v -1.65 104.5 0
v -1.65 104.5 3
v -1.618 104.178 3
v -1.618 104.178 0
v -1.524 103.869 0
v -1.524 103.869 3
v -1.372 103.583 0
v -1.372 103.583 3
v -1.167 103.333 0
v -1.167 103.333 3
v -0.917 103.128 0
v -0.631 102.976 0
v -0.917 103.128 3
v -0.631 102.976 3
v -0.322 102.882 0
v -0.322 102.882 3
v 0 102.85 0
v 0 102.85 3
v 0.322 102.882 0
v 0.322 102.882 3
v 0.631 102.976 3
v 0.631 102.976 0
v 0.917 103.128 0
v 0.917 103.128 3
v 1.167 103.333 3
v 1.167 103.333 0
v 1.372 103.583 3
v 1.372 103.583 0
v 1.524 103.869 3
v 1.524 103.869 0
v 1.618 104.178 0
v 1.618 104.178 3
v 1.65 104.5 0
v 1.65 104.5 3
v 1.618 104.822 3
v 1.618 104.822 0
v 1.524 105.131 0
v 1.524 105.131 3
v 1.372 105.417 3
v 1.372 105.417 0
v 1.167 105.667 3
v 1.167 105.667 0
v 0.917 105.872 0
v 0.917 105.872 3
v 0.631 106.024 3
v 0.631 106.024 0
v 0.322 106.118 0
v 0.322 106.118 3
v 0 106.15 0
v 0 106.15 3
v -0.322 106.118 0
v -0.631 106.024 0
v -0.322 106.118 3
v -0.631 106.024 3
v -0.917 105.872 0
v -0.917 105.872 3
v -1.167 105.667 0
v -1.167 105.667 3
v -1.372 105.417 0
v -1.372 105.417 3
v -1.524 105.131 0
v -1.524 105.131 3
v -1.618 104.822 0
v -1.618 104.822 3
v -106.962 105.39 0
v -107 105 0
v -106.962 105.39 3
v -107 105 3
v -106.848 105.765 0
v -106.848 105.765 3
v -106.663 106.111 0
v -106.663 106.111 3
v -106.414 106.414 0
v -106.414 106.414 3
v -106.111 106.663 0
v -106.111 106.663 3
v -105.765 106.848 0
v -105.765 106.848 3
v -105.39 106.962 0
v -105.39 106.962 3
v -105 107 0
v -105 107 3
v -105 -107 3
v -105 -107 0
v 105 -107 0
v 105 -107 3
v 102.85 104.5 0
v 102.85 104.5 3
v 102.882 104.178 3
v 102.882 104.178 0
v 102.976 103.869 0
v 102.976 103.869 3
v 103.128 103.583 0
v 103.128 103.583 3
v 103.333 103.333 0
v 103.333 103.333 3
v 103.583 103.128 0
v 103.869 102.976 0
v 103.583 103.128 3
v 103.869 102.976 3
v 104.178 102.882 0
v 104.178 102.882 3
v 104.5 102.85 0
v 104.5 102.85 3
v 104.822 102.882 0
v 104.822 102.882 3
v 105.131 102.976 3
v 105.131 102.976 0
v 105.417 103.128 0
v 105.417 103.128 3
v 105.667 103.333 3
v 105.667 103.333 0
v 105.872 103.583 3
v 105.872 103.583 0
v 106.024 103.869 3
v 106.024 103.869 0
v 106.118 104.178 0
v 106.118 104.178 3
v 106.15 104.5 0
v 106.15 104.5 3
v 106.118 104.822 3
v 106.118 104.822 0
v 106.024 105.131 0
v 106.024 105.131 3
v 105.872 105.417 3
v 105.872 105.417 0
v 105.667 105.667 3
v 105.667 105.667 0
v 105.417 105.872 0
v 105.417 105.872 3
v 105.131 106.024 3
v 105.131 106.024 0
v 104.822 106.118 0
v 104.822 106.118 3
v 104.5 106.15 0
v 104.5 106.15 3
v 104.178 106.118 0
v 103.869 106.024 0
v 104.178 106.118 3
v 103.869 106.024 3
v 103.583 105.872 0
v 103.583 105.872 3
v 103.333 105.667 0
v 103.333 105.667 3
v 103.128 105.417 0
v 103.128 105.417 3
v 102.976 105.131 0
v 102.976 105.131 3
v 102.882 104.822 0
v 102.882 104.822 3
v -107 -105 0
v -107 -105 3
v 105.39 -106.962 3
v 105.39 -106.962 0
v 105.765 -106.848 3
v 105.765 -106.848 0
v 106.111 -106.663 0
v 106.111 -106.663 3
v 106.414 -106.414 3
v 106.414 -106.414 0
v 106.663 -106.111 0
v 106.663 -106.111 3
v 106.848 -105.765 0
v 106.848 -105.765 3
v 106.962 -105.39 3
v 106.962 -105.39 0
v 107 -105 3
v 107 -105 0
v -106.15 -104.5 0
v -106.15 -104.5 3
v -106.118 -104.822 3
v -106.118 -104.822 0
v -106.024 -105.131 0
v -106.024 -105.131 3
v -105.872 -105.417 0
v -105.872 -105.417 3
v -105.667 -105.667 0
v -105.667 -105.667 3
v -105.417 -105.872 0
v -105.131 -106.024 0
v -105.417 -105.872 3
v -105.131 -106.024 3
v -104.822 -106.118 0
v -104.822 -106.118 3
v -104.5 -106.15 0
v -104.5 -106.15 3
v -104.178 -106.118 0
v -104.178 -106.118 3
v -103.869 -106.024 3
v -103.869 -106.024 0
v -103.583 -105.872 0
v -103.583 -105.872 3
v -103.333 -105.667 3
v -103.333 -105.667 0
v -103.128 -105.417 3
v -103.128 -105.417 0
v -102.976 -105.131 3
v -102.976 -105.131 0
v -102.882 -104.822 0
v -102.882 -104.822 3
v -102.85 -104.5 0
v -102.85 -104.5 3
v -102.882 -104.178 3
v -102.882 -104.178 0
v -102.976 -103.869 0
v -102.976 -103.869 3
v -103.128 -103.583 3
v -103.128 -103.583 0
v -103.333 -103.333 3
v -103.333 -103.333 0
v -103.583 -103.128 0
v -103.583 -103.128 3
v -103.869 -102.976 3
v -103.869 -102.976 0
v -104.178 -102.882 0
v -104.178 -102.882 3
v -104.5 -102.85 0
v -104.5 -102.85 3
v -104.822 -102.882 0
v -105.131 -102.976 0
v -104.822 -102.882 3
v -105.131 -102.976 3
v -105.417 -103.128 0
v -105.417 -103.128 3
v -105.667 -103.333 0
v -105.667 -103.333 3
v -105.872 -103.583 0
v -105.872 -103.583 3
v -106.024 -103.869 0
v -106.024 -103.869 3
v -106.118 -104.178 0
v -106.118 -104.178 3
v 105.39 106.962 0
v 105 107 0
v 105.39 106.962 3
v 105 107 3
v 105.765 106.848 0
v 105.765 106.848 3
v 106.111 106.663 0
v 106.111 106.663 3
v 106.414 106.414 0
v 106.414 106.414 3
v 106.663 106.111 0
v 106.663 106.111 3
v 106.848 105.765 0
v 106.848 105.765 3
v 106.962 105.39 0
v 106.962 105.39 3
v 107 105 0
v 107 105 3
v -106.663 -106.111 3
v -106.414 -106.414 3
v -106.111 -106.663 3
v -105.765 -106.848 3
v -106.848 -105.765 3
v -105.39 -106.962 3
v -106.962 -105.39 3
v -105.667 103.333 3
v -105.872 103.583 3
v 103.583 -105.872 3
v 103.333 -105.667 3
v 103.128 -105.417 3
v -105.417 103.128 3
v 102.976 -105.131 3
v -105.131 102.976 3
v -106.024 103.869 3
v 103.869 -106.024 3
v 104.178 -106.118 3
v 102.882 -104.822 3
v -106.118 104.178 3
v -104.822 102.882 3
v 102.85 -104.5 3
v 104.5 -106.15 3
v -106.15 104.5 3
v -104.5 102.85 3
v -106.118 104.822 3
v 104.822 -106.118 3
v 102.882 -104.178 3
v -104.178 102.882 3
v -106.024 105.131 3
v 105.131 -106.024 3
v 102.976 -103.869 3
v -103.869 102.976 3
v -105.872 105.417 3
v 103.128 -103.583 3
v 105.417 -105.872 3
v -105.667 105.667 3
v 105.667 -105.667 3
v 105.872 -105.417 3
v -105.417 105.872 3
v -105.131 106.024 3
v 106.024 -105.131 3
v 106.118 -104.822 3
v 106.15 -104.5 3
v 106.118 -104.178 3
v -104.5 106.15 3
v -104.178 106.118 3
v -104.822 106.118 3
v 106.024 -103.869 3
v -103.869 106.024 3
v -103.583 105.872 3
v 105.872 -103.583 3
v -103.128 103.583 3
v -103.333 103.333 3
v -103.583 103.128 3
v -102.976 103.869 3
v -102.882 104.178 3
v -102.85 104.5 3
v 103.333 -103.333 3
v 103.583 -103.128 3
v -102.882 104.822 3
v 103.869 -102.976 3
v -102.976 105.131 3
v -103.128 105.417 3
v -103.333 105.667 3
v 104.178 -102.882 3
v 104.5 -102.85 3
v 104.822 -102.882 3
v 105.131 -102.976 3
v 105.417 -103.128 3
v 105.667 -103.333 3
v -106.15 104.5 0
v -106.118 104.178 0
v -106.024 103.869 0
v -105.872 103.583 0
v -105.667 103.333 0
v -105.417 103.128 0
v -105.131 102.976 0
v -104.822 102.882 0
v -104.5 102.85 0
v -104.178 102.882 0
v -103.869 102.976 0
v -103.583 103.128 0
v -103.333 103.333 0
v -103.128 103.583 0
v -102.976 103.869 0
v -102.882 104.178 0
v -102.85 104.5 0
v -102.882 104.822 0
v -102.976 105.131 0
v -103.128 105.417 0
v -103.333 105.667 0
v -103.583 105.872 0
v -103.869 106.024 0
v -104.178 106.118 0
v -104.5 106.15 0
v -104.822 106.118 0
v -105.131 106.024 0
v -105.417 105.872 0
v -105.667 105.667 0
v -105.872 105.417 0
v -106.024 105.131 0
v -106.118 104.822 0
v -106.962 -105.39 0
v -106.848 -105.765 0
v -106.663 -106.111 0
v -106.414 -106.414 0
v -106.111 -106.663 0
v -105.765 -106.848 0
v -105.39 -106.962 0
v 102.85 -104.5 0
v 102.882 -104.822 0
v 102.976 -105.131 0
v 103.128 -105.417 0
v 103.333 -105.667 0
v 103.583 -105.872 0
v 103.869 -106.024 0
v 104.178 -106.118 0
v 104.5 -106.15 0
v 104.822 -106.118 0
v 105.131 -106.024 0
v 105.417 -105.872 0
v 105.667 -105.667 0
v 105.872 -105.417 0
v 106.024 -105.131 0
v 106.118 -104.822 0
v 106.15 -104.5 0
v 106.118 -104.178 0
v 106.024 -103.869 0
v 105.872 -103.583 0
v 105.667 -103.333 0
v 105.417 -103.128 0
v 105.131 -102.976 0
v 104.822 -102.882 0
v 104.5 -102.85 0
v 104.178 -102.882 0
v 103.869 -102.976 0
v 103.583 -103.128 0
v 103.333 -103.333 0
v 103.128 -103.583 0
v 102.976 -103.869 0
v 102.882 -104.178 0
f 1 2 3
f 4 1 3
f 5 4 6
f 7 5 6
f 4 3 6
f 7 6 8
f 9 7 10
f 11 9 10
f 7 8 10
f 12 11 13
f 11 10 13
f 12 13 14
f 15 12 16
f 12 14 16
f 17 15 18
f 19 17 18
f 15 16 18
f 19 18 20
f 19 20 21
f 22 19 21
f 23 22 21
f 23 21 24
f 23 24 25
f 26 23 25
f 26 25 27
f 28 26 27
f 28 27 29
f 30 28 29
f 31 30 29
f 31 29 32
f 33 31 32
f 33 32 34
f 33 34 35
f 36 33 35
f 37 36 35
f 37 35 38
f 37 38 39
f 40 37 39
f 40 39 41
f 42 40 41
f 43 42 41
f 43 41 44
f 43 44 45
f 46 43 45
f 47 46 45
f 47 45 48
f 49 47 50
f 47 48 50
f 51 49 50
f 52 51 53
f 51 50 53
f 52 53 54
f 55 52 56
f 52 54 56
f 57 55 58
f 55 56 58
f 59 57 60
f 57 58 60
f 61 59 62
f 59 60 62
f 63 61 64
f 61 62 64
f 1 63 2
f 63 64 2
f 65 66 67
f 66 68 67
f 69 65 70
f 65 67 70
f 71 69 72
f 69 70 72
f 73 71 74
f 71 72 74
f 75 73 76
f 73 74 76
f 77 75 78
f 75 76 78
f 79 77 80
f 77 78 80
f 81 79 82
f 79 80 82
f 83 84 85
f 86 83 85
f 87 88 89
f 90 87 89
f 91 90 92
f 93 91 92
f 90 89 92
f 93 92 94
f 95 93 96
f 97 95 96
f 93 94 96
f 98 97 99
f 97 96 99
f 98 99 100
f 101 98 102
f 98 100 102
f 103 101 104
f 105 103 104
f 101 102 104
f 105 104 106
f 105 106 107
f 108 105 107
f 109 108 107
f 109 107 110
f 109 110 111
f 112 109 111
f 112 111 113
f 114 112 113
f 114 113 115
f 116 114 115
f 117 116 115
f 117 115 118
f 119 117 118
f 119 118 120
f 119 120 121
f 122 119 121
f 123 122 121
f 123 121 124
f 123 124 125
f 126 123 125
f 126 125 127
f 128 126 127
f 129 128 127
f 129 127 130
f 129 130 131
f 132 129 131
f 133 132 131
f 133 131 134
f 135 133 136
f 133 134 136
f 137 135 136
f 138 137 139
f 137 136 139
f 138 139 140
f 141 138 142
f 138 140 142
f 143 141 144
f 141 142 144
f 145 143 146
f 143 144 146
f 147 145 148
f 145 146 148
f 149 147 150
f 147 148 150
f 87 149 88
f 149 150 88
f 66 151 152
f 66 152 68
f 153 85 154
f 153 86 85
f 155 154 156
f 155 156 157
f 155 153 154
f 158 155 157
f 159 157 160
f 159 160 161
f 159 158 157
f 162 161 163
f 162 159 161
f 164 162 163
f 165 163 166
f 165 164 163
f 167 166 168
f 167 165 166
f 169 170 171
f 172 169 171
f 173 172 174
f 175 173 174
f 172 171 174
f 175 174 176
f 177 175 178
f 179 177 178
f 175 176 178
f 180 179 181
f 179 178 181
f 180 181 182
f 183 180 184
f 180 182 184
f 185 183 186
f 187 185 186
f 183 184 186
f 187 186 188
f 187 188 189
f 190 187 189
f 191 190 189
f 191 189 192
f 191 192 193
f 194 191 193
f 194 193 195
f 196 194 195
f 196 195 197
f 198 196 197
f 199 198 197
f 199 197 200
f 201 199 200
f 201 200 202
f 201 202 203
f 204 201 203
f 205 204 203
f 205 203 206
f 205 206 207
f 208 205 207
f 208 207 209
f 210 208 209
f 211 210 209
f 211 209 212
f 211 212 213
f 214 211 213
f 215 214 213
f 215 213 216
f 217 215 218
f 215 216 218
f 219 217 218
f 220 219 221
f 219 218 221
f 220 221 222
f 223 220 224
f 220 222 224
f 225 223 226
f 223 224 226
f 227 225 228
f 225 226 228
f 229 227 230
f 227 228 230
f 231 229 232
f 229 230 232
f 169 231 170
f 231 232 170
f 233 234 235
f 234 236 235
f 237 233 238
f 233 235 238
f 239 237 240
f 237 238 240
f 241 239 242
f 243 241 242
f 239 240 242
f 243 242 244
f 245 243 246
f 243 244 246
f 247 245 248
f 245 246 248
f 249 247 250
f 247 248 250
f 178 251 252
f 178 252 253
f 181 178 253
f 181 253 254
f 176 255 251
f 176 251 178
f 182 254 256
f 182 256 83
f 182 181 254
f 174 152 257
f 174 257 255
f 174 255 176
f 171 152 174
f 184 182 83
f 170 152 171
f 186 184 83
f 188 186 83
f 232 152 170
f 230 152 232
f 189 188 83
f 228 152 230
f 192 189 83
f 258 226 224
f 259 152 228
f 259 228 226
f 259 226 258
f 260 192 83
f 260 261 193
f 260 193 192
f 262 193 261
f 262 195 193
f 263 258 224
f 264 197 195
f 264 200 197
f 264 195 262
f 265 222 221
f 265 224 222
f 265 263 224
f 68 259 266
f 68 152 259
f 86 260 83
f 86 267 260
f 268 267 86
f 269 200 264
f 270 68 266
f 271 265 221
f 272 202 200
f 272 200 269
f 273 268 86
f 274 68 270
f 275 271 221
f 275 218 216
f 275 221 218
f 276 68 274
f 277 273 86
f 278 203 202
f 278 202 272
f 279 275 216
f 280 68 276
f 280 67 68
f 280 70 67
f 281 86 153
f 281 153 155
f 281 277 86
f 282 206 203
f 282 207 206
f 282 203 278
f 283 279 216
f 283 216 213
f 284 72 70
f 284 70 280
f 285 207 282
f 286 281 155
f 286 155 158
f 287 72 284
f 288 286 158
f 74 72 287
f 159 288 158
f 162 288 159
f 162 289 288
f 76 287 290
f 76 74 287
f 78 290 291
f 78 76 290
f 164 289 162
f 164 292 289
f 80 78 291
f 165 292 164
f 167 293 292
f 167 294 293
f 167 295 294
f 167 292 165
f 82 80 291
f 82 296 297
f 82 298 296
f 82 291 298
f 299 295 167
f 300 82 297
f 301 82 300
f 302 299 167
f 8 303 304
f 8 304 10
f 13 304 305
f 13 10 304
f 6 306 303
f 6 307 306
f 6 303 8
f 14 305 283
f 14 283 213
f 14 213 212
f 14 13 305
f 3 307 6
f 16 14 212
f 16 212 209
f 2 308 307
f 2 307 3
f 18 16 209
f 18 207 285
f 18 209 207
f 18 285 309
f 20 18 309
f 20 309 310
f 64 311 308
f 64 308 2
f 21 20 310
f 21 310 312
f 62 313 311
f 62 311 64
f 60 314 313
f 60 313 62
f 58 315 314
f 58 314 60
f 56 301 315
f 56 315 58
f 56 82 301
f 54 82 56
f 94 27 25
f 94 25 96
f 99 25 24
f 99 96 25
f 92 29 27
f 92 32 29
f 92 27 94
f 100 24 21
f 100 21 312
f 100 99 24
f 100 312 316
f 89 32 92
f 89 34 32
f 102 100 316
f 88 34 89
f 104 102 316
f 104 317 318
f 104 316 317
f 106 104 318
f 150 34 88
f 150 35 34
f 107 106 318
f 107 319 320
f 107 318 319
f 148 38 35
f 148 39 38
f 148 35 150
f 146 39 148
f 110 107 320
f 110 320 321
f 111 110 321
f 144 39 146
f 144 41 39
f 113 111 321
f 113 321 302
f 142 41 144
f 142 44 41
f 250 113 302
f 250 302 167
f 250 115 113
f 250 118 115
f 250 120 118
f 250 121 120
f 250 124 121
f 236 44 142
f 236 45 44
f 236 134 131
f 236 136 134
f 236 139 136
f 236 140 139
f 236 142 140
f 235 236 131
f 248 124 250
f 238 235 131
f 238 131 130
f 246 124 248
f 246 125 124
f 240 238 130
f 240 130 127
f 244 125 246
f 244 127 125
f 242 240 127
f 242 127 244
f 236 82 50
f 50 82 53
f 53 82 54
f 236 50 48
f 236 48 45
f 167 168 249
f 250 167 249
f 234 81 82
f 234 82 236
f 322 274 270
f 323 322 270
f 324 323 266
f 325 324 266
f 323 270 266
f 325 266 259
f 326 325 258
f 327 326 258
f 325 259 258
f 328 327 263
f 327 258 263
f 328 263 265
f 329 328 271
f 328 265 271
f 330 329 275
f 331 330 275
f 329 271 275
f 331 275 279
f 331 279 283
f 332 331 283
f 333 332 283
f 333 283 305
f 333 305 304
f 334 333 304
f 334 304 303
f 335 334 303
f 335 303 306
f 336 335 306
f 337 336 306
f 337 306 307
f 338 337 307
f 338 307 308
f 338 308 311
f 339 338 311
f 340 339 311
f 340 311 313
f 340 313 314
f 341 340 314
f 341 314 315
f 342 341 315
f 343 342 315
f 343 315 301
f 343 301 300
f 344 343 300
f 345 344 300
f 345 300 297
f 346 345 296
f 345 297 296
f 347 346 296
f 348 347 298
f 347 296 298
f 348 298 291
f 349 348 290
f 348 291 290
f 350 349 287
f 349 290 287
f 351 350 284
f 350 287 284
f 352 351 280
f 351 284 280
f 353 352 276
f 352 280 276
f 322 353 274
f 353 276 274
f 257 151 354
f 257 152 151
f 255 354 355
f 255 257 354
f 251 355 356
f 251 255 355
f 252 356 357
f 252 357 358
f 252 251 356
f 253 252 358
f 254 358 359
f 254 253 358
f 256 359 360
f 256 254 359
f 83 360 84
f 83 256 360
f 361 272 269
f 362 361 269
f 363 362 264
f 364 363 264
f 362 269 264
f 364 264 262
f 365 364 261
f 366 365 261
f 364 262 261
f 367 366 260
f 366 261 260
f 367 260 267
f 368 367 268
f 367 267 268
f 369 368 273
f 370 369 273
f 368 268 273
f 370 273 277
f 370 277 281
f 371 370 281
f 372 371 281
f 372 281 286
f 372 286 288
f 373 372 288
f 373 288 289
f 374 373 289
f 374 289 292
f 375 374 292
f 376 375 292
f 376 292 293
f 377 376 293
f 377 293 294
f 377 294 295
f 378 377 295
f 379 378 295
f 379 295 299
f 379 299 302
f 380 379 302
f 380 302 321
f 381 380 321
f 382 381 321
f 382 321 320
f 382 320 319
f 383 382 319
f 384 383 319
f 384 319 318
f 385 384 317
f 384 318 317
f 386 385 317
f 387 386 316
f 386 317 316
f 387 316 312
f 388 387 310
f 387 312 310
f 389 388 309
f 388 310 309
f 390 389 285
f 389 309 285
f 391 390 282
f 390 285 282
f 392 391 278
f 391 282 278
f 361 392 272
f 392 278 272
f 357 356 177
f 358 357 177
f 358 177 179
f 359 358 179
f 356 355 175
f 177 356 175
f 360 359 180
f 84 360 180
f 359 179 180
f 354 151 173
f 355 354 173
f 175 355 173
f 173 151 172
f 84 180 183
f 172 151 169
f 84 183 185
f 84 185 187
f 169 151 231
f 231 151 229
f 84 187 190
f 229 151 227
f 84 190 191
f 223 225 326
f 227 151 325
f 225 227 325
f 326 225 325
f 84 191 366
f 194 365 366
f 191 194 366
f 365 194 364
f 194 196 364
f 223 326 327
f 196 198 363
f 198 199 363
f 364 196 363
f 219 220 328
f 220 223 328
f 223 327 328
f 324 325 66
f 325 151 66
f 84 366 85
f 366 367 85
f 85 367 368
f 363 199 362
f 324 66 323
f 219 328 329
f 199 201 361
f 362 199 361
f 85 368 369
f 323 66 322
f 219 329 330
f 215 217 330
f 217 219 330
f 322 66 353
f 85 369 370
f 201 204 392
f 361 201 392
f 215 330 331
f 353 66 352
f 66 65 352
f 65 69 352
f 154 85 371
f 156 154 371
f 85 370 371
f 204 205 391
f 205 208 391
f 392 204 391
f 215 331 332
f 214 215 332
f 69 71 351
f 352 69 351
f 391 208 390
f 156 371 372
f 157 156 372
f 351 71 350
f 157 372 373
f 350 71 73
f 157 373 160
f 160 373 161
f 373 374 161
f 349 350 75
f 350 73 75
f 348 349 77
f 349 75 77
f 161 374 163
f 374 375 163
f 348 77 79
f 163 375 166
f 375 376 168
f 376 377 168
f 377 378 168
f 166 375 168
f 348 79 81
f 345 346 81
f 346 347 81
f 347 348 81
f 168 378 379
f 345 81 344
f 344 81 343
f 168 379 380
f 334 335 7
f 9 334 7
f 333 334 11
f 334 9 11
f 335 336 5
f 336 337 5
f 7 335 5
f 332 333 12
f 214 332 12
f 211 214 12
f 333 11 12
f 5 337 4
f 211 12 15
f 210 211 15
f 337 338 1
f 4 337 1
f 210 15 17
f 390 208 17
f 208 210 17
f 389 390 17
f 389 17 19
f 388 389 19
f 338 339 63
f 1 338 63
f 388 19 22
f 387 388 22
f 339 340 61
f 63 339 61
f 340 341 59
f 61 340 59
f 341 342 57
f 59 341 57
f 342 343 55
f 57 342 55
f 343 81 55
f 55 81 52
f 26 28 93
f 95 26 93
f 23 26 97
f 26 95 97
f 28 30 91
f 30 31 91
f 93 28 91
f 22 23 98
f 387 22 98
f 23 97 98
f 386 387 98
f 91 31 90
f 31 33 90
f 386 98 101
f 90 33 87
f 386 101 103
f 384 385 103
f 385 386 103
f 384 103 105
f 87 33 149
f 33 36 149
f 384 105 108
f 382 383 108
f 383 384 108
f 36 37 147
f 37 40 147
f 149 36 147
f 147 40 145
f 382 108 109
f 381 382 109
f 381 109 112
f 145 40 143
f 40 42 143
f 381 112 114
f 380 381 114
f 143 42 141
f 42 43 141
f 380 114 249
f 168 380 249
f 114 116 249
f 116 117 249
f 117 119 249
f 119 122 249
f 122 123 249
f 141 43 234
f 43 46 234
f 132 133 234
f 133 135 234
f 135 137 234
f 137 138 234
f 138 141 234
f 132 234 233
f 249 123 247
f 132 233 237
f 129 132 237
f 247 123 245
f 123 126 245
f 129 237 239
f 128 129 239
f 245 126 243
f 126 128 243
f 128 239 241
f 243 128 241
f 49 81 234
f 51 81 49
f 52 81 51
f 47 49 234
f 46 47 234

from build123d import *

# Parameters (mm, degrees)
F0_W     = 214
F0_H     = 214
F1_DEPTH = 3
F2_D     = 3.3
F3_R     = 2


with BuildPart() as f1:
    # F0 (on Top) → F1 (new body)
    with BuildSketch(Plane.XY):
        Rectangle(F0_W, F0_H)
    extrude(amount=F1_DEPTH)

    # F2 (through all)
    with Locations(Plane(origin=(0, 0, 0), x_dir=(1, 0, 0), z_dir=(0, 0, -1))):
        with Locations((104.5, 104.5), (-104.5, 104.5), (-104.5, -104.5), (0, -104.5), (104.5, -104.5)):
            Hole(F2_D / 2)

    # F3
    f3_edges = [f1.edges().sort_by_distance(p)[0] for p in [
        (-107, -107, 1.5),
        (107, -107, 1.5),
        (107, 107, 1.5),
        (-107, 107, 1.5),
    ]]
    fillet(f3_edges, radius=F3_R)


solid = f1.part
